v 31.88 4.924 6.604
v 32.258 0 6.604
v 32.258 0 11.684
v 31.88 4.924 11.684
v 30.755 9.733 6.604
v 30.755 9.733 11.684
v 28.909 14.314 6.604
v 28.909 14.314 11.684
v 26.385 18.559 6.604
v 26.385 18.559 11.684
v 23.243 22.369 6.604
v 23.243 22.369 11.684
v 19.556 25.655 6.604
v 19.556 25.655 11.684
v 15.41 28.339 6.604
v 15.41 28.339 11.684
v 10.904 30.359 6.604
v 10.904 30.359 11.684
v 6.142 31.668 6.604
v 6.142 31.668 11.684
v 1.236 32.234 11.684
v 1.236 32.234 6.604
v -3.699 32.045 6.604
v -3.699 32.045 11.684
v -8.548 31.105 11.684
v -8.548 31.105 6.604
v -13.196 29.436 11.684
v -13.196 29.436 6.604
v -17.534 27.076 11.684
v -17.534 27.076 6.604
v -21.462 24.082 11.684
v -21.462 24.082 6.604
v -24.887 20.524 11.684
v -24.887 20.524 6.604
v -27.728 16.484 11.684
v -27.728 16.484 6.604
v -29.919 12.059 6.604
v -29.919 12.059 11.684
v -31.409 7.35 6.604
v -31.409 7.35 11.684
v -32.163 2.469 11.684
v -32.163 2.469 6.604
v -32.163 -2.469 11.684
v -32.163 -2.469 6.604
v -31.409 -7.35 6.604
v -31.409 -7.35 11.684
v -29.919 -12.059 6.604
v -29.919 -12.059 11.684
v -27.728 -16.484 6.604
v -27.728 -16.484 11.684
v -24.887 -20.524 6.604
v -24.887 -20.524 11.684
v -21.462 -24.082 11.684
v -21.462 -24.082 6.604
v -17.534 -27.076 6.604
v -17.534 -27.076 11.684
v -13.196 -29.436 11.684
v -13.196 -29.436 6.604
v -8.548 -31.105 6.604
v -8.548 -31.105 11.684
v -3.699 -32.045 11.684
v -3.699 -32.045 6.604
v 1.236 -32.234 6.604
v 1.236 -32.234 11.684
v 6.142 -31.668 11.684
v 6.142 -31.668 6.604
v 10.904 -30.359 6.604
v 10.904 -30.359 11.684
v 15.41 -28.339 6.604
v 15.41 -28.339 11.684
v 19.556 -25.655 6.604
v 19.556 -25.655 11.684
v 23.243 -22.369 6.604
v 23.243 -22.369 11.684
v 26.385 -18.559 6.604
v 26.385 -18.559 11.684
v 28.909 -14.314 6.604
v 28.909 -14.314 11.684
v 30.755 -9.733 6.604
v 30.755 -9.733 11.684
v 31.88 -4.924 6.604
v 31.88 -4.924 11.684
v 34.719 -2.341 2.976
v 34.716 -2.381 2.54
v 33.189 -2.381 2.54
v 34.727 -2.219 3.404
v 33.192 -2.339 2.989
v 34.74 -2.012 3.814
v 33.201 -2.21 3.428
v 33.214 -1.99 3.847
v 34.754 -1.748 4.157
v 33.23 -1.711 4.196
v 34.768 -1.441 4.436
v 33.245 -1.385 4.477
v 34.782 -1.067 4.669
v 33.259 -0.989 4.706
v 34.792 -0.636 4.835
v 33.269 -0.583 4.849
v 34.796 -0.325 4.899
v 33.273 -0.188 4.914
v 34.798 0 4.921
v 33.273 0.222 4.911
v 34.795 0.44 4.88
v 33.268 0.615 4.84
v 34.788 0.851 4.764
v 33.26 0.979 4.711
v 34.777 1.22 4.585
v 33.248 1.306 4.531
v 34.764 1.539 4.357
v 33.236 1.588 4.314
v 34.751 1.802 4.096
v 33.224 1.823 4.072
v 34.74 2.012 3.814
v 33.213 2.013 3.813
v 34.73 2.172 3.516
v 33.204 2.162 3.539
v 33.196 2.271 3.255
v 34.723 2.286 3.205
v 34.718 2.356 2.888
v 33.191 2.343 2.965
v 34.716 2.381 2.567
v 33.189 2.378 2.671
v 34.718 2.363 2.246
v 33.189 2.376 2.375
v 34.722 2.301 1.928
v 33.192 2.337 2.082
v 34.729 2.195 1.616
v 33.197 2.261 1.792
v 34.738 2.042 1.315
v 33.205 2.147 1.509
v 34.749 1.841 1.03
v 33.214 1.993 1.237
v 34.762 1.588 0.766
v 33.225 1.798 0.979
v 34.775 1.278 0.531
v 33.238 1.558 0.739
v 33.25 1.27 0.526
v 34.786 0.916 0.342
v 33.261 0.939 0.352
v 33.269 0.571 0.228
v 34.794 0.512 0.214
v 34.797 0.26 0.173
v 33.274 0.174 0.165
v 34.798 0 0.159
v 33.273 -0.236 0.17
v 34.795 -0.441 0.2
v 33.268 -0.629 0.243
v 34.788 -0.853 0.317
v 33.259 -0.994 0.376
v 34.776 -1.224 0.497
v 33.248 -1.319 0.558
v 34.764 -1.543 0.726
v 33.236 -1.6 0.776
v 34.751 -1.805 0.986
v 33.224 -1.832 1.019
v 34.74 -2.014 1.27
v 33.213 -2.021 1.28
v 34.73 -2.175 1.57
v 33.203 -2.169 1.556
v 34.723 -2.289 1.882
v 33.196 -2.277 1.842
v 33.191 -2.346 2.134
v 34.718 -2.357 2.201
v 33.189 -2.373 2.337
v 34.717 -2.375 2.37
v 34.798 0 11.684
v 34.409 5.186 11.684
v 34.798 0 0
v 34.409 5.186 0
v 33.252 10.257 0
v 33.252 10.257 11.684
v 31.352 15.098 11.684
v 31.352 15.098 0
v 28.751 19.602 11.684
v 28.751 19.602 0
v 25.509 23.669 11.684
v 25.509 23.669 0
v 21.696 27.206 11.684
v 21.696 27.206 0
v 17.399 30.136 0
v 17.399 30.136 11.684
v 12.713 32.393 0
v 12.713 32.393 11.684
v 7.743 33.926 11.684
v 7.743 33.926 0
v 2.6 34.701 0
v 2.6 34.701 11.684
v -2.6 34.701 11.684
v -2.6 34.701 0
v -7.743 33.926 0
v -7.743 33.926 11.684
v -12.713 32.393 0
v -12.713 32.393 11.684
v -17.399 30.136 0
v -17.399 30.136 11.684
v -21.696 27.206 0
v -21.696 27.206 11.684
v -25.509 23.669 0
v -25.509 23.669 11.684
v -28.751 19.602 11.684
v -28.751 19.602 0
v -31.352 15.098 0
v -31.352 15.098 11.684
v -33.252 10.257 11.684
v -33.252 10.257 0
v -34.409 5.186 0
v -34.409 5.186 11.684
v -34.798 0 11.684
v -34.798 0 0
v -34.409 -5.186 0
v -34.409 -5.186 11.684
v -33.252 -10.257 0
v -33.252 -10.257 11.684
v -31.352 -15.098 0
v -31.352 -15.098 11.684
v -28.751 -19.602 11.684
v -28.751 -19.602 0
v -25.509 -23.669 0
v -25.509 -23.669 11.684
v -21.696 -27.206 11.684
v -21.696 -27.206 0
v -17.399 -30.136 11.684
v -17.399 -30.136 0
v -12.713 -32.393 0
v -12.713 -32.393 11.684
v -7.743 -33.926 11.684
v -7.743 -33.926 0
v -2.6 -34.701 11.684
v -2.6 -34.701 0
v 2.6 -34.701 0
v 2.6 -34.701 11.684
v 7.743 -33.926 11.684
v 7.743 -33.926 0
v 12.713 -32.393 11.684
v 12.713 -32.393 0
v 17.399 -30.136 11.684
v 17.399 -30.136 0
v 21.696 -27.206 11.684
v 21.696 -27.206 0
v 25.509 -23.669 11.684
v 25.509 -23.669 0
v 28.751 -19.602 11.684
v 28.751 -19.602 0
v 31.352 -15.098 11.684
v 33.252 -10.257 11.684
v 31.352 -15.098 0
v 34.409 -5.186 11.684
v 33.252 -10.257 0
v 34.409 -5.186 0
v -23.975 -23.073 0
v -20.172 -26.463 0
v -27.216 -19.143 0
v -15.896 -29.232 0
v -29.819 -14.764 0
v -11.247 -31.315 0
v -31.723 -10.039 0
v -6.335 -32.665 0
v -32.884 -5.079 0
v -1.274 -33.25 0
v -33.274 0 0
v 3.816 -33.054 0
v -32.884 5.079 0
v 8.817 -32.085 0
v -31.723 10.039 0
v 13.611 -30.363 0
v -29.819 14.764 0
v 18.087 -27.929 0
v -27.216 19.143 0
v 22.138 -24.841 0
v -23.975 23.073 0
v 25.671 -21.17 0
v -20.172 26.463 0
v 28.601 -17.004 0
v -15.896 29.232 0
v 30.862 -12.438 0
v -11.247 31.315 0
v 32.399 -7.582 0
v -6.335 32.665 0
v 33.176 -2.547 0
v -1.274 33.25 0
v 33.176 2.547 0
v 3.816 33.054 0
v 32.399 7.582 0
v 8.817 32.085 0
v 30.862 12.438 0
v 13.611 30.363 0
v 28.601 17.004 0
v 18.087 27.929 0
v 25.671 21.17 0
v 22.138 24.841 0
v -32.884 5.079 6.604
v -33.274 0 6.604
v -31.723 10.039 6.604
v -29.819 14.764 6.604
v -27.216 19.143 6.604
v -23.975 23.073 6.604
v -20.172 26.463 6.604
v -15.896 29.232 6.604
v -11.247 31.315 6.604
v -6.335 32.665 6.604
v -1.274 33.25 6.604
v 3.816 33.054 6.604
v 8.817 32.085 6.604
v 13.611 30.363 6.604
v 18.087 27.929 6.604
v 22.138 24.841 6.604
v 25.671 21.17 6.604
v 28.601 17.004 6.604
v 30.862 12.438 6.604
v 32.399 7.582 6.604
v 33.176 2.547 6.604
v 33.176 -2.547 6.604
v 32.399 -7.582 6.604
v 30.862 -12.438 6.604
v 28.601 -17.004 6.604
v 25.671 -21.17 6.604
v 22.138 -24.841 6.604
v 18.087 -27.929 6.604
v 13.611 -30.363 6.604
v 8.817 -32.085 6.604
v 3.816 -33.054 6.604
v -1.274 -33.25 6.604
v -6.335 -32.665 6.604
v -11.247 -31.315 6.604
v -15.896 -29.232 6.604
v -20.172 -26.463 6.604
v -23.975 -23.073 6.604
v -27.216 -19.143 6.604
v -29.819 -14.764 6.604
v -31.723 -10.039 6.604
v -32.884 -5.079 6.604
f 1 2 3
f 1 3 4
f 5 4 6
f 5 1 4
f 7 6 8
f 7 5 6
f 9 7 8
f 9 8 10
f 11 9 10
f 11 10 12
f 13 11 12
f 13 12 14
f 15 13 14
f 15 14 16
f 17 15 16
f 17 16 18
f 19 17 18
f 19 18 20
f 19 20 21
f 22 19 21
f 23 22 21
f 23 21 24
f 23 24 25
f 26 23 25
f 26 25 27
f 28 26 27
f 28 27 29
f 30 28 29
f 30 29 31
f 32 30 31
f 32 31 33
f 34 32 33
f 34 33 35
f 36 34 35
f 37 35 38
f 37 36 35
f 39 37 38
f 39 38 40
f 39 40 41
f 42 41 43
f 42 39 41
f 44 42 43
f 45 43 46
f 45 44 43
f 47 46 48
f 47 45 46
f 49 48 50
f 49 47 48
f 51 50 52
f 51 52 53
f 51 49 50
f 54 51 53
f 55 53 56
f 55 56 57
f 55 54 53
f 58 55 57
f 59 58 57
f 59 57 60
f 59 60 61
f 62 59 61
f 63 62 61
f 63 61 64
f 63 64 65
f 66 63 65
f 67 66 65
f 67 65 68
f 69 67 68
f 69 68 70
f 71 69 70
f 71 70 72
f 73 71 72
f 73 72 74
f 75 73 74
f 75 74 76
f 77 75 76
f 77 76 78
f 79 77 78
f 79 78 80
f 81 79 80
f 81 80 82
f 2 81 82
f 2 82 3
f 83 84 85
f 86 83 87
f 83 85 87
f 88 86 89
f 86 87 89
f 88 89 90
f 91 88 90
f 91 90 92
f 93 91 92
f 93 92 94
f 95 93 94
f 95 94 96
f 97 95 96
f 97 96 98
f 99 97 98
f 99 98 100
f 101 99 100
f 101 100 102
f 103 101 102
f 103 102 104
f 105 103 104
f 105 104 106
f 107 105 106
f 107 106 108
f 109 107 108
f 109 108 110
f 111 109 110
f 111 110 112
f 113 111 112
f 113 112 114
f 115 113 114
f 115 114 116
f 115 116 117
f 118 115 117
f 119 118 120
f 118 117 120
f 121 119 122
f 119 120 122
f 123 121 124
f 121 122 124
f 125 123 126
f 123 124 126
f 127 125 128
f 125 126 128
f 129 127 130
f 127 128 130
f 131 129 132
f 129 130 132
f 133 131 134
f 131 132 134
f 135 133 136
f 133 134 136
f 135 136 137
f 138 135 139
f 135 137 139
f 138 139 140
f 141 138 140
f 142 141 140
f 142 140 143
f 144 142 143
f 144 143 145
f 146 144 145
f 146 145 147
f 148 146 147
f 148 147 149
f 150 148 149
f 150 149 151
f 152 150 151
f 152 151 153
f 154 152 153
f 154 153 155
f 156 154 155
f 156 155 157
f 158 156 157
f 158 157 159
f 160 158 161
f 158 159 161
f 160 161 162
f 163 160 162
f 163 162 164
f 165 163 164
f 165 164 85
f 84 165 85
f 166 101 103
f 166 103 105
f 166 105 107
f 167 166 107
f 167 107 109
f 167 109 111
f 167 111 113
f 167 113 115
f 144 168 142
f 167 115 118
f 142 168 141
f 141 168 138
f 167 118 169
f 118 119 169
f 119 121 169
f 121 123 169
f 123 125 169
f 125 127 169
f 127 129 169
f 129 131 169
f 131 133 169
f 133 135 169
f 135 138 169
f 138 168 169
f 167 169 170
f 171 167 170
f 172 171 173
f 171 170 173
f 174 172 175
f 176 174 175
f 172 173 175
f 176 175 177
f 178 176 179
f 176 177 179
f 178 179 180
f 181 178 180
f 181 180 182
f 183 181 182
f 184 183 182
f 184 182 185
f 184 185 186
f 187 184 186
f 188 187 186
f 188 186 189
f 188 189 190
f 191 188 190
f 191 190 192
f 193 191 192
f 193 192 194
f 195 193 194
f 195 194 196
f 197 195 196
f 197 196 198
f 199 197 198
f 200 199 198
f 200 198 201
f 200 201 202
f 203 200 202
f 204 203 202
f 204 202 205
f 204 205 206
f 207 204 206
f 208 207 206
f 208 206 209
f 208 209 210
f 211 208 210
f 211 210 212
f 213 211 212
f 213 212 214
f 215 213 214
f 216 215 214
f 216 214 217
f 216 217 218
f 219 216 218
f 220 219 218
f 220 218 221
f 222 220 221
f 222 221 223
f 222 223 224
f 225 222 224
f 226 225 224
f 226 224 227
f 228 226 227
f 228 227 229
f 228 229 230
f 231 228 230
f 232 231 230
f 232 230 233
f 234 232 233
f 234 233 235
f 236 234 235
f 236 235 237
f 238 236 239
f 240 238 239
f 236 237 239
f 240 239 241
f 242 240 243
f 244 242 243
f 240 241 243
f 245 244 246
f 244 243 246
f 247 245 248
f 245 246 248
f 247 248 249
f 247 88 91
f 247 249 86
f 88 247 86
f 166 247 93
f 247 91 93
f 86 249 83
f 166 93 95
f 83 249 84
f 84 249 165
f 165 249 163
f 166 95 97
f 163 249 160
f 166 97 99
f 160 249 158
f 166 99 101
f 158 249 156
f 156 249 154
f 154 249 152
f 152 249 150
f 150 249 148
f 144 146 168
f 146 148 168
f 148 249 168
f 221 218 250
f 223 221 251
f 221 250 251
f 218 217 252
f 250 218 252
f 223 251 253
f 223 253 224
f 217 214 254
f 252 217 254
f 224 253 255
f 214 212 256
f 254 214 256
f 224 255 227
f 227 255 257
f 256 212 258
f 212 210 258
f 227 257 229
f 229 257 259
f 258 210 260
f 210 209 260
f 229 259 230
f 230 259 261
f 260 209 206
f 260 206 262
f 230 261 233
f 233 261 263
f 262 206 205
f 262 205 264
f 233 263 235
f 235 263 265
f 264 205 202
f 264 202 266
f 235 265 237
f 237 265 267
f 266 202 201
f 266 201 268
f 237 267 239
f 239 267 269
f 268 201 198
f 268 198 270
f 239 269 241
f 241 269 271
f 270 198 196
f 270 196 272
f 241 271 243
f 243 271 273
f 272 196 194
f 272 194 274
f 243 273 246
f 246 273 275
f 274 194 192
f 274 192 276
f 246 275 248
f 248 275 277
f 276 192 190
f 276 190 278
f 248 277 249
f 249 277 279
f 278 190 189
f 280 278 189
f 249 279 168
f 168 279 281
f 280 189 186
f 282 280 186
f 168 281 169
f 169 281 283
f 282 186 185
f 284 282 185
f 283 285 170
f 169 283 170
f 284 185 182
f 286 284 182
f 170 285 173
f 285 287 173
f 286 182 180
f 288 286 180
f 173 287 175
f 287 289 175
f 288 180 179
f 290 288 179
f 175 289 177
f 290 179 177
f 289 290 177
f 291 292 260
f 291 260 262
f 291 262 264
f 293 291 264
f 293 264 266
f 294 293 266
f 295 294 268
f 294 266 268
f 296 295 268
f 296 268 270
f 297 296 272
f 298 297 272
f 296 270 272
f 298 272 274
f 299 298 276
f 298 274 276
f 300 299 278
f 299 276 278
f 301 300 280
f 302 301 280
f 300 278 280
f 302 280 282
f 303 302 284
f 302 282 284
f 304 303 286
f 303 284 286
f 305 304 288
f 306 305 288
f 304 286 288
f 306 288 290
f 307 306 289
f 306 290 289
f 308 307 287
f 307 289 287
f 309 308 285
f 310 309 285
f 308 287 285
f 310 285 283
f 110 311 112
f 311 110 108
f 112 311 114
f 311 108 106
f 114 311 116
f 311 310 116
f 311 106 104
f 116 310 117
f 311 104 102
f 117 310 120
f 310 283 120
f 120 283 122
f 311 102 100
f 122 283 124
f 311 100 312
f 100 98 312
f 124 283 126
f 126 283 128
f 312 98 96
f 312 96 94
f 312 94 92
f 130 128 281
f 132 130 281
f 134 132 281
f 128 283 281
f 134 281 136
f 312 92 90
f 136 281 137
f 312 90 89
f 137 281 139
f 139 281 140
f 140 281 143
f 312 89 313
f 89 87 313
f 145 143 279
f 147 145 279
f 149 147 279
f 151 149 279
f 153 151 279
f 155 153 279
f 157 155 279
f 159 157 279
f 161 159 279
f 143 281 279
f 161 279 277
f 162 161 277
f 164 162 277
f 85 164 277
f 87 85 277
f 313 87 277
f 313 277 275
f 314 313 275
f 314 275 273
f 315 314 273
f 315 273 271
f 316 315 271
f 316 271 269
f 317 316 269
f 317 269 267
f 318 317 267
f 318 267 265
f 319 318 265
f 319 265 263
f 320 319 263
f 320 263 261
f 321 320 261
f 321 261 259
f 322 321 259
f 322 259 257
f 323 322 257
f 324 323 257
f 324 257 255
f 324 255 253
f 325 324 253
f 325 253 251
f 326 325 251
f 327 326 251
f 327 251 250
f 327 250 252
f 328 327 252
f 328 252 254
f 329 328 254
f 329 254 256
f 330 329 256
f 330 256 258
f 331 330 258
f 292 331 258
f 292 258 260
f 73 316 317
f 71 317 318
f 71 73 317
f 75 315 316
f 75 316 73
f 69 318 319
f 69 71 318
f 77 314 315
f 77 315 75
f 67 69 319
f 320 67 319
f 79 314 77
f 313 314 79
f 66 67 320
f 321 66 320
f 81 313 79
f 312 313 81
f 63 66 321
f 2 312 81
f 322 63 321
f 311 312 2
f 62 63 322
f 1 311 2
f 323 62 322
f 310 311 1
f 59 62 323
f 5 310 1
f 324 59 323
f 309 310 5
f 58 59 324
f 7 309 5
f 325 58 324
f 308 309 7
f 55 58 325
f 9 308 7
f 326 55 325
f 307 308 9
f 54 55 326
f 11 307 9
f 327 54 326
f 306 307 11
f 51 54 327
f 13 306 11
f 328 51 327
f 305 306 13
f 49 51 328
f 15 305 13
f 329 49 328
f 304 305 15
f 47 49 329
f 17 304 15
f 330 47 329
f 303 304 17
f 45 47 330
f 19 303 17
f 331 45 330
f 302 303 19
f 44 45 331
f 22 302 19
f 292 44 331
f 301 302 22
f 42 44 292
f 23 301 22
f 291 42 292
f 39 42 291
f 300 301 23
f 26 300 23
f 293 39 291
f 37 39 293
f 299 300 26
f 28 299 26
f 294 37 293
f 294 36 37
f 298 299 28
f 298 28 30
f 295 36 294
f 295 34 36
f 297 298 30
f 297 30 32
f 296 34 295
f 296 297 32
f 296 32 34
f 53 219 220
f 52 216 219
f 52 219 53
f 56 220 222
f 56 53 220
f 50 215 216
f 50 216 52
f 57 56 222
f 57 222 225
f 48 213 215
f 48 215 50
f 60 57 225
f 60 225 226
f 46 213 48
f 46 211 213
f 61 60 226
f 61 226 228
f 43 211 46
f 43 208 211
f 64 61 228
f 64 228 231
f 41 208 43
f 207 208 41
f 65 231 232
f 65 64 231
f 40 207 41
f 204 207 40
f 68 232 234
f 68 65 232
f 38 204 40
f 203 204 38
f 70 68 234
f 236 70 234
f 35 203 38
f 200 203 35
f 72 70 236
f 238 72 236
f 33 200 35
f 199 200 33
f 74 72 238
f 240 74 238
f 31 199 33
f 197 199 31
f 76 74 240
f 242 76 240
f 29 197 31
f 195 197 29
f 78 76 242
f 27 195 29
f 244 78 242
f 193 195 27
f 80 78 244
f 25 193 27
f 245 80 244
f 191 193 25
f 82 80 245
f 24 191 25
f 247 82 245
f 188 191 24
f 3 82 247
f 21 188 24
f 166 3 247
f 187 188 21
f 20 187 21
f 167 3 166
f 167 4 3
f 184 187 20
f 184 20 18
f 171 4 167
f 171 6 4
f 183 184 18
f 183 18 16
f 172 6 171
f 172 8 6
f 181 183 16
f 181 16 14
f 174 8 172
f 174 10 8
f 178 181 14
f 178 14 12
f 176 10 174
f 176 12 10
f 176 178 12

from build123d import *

# Parameters (mm, degrees)
SKETCH1_R                          = 34.798
SKETCH1_R_2                        = 32.258
BOSS_EXTRUDE1_DEPTH                = 11.684
F_3_16_0_1875_DIAMETER_HOLE1_D     = 4.7625
F_3_16_0_1875_DIAMETER_HOLE1_DEPTH = 54.102
F_3_16_0_1875_DIAMETER_HOLE1_TIP   = 1.430799349
SKETCH3_R                          = 33.274
SKETCH3_R_2                        = 32.258
CUT_EXTRUDE1_DEPTH                 = 6.604


with BuildPart() as part:
    # Sketch1 → Boss-Extrude1 (new body)
    with BuildSketch(Plane.XY):
        Circle(SKETCH1_R)
        Circle(SKETCH1_R_2, mode=Mode.SUBTRACT)
    extrude(amount=BOSS_EXTRUDE1_DEPTH)

    # 3/16 (0.1875) Diameter Hole1
    with Locations(Plane(origin=(34.798, 0, 2.54), x_dir=(0, 1, 0), z_dir=(1, 0, 0))):
        with Locations((0, 0)):
            Hole(F_3_16_0_1875_DIAMETER_HOLE1_D / 2, depth=F_3_16_0_1875_DIAMETER_HOLE1_DEPTH)
            with Locations((0, 0, -(F_3_16_0_1875_DIAMETER_HOLE1_DEPTH + F_3_16_0_1875_DIAMETER_HOLE1_TIP / 2))):  # 118° drill point
                Cone(0, F_3_16_0_1875_DIAMETER_HOLE1_D / 2, F_3_16_0_1875_DIAMETER_HOLE1_TIP, mode=Mode.SUBTRACT)

    # Sketch3 → Cut-Extrude1 (cut)
    with BuildSketch(Plane(origin=(0, 0, 0), x_dir=(-1, 0, 0), z_dir=(0, 0, -1))):
        Circle(SKETCH3_R)
        Circle(SKETCH3_R_2, mode=Mode.SUBTRACT)
    extrude(amount=-CUT_EXTRUDE1_DEPTH, mode=Mode.SUBTRACT)


solid = part.part
